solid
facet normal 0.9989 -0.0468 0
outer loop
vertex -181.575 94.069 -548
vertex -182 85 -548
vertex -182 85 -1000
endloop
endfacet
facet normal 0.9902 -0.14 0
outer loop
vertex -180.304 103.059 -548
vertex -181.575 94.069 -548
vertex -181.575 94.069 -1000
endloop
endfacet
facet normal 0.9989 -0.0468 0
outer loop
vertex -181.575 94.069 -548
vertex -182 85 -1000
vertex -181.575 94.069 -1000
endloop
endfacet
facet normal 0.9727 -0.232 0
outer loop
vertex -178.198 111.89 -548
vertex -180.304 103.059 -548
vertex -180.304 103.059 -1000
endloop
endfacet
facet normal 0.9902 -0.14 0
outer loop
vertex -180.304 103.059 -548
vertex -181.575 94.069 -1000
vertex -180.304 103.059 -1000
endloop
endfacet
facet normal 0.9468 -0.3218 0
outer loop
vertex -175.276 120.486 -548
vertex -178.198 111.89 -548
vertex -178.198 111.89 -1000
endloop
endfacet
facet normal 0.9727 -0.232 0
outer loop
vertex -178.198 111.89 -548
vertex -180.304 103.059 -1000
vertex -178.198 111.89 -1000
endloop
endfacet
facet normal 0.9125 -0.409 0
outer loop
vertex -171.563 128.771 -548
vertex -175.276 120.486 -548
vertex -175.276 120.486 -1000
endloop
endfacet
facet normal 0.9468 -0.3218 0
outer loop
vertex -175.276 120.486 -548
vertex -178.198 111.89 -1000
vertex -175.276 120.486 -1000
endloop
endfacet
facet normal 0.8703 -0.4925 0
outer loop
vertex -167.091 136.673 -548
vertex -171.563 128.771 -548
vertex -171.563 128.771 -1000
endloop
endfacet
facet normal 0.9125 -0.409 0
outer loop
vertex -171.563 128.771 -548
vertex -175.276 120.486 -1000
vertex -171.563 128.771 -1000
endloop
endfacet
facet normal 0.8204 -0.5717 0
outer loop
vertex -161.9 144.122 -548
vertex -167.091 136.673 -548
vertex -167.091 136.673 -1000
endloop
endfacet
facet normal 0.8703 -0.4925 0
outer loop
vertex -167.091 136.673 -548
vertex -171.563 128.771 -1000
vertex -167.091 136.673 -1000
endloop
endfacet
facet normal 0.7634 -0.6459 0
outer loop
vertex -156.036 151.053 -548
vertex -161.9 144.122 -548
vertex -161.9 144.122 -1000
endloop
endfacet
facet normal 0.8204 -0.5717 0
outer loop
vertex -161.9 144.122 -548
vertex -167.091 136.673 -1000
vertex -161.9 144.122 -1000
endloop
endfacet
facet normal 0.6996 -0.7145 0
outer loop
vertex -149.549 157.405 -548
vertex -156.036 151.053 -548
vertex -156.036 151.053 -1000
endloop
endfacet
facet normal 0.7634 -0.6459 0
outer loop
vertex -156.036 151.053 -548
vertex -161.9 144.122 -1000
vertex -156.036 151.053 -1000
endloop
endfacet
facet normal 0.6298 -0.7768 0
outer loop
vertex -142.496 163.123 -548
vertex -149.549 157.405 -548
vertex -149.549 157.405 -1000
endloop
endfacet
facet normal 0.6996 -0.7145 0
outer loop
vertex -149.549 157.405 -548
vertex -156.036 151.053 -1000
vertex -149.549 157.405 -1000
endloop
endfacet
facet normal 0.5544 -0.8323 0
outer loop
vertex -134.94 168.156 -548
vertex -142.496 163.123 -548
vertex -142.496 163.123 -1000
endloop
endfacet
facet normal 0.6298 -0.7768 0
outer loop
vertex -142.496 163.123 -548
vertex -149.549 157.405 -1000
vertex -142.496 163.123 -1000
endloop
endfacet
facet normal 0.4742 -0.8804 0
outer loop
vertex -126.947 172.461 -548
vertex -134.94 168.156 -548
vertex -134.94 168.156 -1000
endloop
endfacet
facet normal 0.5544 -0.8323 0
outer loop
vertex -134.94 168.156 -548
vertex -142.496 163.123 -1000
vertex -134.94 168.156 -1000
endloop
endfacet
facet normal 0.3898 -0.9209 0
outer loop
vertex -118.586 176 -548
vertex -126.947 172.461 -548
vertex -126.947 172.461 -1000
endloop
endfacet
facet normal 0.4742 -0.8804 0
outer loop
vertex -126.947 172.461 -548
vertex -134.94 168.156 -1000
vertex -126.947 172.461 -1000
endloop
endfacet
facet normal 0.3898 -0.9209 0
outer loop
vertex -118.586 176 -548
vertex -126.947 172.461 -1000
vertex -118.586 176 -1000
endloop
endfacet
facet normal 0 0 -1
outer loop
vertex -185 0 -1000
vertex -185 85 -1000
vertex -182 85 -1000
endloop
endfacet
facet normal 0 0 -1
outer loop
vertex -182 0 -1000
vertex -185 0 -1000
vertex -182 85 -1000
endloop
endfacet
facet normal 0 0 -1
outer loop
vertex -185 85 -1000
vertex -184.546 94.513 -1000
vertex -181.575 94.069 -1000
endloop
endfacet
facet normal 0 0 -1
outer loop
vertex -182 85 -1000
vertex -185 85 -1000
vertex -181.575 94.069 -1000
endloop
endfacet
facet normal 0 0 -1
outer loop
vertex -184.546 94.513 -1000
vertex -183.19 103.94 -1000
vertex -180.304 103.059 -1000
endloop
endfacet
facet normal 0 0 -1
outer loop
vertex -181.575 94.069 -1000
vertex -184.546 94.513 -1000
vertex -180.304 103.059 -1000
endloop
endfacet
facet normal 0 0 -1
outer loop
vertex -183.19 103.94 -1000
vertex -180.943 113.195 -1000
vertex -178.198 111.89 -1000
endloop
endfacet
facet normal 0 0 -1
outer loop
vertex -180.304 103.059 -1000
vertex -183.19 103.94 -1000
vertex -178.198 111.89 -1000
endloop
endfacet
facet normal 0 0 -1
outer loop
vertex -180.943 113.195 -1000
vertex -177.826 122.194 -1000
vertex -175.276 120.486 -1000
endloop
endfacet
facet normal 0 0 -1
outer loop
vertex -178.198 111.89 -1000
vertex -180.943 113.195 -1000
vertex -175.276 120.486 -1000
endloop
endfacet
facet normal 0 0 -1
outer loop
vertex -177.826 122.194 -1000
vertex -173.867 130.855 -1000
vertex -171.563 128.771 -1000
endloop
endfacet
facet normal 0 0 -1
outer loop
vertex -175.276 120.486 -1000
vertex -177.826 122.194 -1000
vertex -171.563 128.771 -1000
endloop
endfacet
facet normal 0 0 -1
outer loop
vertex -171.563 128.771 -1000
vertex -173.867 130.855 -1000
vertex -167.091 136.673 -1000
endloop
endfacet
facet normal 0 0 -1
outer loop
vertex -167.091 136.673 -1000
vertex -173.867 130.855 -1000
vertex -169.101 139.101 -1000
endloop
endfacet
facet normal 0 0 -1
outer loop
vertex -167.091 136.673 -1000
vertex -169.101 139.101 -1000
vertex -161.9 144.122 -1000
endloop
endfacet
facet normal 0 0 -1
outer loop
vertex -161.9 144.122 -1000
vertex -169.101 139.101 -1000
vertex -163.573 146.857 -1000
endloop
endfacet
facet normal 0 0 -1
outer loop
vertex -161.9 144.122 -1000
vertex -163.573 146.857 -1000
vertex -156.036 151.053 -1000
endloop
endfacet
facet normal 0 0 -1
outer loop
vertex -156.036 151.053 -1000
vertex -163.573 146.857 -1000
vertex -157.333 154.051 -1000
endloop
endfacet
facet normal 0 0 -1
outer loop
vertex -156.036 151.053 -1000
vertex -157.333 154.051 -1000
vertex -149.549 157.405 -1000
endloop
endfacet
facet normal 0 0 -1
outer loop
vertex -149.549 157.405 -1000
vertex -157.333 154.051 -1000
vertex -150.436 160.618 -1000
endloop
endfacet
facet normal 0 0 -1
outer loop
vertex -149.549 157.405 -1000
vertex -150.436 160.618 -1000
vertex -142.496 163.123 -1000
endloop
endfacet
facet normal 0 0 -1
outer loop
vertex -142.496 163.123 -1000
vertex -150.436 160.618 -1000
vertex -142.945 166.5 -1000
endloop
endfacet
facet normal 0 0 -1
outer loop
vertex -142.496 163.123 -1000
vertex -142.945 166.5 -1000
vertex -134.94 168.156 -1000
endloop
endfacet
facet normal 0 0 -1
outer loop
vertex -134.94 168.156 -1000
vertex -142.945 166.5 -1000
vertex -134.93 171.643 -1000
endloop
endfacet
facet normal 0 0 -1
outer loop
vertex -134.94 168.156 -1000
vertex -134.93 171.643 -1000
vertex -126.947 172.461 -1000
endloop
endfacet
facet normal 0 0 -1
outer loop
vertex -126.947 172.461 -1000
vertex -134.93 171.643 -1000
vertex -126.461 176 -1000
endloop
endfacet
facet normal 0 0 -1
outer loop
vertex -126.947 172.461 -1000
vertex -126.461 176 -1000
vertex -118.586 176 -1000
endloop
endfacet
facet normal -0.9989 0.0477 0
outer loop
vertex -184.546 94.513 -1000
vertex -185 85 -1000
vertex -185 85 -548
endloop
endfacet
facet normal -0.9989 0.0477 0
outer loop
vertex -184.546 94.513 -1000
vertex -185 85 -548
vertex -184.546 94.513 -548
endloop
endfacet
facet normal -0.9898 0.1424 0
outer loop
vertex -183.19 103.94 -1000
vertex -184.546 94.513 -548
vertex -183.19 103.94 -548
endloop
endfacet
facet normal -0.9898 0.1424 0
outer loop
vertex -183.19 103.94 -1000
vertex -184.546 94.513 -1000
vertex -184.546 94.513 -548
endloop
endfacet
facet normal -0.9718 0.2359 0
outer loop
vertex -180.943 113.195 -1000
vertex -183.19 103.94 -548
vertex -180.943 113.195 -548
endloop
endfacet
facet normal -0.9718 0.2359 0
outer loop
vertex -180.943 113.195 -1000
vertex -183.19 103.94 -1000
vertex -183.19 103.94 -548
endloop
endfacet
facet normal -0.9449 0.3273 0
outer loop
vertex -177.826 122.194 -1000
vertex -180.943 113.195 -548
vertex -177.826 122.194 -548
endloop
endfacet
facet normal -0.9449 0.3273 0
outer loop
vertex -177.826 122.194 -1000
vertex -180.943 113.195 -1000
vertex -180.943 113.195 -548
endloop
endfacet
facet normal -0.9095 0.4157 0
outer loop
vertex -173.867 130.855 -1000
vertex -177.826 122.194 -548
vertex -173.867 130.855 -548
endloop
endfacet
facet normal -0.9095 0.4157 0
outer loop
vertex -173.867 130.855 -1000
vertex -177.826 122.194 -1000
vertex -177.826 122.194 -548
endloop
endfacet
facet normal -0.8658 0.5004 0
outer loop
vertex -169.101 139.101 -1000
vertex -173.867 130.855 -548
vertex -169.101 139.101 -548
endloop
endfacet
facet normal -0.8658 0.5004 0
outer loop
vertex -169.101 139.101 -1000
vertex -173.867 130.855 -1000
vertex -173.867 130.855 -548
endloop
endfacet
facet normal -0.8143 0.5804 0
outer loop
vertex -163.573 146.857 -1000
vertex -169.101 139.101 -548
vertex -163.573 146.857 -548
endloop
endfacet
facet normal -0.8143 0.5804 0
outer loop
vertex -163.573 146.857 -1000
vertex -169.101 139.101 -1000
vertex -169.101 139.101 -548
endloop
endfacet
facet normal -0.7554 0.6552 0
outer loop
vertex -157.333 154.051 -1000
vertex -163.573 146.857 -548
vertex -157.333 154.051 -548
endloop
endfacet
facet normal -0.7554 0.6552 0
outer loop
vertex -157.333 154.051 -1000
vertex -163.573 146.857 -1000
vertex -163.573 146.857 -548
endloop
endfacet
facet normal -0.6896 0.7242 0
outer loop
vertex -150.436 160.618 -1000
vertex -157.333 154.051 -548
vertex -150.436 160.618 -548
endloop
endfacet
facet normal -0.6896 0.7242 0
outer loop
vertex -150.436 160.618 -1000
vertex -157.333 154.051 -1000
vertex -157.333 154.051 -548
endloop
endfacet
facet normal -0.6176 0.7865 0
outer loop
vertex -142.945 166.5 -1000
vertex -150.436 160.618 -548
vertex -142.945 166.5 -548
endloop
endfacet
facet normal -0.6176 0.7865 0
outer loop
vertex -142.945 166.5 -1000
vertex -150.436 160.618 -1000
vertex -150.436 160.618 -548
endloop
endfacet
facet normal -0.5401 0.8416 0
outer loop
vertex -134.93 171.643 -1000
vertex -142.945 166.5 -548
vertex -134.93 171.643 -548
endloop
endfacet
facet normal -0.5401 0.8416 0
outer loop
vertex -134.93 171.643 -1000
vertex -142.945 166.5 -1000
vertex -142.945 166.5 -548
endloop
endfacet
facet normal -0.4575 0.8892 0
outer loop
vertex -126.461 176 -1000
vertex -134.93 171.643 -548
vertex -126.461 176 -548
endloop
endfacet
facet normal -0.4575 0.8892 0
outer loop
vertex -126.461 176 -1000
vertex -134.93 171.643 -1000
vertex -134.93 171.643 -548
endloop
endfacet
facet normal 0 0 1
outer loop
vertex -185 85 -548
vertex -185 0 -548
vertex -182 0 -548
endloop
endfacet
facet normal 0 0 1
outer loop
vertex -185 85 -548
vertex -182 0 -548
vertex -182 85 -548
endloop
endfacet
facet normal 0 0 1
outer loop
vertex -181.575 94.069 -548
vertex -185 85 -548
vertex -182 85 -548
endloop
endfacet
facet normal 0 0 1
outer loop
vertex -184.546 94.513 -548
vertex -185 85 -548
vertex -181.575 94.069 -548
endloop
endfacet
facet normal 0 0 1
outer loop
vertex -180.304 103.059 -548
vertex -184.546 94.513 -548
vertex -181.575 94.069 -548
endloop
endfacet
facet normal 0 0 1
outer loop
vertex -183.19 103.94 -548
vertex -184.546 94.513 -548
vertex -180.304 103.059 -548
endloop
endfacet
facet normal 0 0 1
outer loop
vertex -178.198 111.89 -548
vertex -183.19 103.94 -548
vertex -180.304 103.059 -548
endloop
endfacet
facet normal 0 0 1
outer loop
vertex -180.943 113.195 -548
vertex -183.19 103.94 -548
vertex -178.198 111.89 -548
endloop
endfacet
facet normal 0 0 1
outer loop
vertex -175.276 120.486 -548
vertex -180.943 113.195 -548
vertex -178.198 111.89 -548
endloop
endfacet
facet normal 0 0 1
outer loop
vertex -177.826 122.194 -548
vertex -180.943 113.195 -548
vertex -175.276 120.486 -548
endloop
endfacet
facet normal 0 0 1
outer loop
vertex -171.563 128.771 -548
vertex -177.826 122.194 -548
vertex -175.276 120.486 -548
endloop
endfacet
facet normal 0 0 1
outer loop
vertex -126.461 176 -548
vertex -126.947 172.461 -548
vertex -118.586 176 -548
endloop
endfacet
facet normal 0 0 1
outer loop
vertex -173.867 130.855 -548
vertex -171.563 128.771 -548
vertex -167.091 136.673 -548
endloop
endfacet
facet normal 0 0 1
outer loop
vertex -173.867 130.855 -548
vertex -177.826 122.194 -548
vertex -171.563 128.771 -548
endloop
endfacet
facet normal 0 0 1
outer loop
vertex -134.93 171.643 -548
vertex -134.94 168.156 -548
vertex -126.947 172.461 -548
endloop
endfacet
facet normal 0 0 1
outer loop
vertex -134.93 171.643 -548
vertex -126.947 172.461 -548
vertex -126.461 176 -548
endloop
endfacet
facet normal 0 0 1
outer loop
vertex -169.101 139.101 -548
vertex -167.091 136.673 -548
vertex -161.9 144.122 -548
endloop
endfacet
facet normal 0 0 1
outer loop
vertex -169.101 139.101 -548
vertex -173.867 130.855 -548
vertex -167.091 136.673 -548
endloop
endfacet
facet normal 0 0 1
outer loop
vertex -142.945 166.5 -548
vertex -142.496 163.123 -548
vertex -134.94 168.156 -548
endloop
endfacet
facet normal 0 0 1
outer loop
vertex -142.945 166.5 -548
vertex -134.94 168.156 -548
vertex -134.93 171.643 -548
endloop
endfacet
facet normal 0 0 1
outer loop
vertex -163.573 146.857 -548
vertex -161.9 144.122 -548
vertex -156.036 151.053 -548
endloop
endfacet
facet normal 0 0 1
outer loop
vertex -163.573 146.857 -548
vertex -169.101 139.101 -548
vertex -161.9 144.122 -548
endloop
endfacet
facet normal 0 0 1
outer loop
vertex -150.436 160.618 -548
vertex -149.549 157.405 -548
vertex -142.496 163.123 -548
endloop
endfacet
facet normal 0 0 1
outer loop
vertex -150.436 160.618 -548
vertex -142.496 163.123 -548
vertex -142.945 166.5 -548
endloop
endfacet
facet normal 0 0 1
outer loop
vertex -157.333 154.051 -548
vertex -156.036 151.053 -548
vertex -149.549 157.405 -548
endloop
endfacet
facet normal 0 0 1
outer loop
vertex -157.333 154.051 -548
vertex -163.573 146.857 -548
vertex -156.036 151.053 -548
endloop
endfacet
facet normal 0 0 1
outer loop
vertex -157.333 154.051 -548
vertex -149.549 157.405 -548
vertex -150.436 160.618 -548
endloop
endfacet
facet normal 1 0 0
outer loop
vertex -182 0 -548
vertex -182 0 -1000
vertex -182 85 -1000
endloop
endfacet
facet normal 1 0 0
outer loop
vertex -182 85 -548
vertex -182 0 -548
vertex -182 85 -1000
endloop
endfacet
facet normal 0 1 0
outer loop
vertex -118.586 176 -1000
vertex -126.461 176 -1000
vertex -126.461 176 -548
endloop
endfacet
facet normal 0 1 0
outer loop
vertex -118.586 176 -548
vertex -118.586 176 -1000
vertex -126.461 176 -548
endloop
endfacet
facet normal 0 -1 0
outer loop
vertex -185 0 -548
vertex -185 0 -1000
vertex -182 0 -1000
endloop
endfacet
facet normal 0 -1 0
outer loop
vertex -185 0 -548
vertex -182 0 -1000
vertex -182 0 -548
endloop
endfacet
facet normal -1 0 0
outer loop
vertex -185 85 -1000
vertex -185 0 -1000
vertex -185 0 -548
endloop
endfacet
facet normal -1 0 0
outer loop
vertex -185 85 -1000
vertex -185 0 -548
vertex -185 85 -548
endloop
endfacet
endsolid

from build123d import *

# Parameters (mm, degrees)
SKETCH1_W               = 370
SKETCH1_H               = 370
BOSS_EXTRUDE1_DEPTH     = 1000
FILLET1_R               = 100
SHELL1_T                = -3
SKETCH2_W               = 241.73479806
SKETCH2_H               = 394.761154712
CUT_EXTRUDE1_DEPTH      = 2018.039910364
CUT_EXTRUDE2_DEPTH      = 1034.125839383
CUT_EXTRUDE2_DEPTH_BACK = 1034.125839383
SKETCH3_W               = 1896.128472869
SKETCH3_H               = 1300.286243779
SKETCH5_W               = 669.384629734
SKETCH5_H               = 44.432040192
SKETCH5_H_2             = 62.844566938
CUT_EXTRUDE4_DEPTH      = 1034.658550973
SKETCH4_W               = 536.60110681
SKETCH4_H               = 206.247567531
CUT_EXTRUDE5_DEPTH      = 1018.539609917


with BuildPart() as part:
    # Sketch1 → Boss-Extrude1 (new, symmetric)
    with BuildSketch(Plane.XY):
        Rectangle(SKETCH1_W, SKETCH1_H)
    extrude(amount=BOSS_EXTRUDE1_DEPTH, both=True)

    # Fillet1
    fillet1_edges = [part.edges().sort_by_distance(p)[0] for p in [
        (-185, 185, 0),
        (185, 185, 0),
        (185, -185, 0),
        (-185, -185, 0),
    ]]
    fillet(fillet1_edges, radius=FILLET1_R)

    # Shell1
    shell1_openings = [part.faces().sort_by_distance(p)[0] for p in [
        (0, 0, -1000),
    ]]
    offset(amount=SHELL1_T, openings=shell1_openings, kind=Kind.INTERSECTION)

    # Sketch2 → Cut-Extrude1 (cut, through all)
    with BuildSketch(Plane.XY.offset(1000)):
        with Locations((120.86739903, -12.380577356)):
            Rectangle(SKETCH2_W, SKETCH2_H)
    extrude(amount=-CUT_EXTRUDE1_DEPTH, mode=Mode.SUBTRACT)

    # Sketch3 → Cut-Extrude2 (cut, two sides: drawn at the far end of the back side and taken through both)
    with BuildSketch(Plane(origin=(-182, 0, 0), x_dir=(0, 0, -1), z_dir=(1, 0, 0)).offset(-CUT_EXTRUDE2_DEPTH_BACK)):
        with Locations((-400.064236435, -68.17726838)):
            Rectangle(SKETCH3_W, SKETCH3_H)
    extrude(amount=CUT_EXTRUDE2_DEPTH + CUT_EXTRUDE2_DEPTH_BACK, mode=Mode.SUBTRACT)

    # Sketch5 → Cut-Extrude4 (cut, through all)
    with BuildSketch(Plane.ZY.offset(185)):
        with Locations((-762.41238843, 198.216020096)):
            Rectangle(SKETCH5_W, SKETCH5_H)
        with Locations((-762.41238843, -207.422283469)):
            Rectangle(SKETCH5_W, SKETCH5_H_2)
    extrude(amount=-CUT_EXTRUDE4_DEPTH, mode=Mode.SUBTRACT)

    # Sketch4 → Cut-Extrude5 (cut, through all)
    with BuildSketch(Plane.ZY.offset(185)):
        with Locations((-731.699446595, -103.123783766)):
            Rectangle(SKETCH4_W, SKETCH4_H)
    extrude(amount=-CUT_EXTRUDE5_DEPTH, mode=Mode.SUBTRACT)


solid = part.part
